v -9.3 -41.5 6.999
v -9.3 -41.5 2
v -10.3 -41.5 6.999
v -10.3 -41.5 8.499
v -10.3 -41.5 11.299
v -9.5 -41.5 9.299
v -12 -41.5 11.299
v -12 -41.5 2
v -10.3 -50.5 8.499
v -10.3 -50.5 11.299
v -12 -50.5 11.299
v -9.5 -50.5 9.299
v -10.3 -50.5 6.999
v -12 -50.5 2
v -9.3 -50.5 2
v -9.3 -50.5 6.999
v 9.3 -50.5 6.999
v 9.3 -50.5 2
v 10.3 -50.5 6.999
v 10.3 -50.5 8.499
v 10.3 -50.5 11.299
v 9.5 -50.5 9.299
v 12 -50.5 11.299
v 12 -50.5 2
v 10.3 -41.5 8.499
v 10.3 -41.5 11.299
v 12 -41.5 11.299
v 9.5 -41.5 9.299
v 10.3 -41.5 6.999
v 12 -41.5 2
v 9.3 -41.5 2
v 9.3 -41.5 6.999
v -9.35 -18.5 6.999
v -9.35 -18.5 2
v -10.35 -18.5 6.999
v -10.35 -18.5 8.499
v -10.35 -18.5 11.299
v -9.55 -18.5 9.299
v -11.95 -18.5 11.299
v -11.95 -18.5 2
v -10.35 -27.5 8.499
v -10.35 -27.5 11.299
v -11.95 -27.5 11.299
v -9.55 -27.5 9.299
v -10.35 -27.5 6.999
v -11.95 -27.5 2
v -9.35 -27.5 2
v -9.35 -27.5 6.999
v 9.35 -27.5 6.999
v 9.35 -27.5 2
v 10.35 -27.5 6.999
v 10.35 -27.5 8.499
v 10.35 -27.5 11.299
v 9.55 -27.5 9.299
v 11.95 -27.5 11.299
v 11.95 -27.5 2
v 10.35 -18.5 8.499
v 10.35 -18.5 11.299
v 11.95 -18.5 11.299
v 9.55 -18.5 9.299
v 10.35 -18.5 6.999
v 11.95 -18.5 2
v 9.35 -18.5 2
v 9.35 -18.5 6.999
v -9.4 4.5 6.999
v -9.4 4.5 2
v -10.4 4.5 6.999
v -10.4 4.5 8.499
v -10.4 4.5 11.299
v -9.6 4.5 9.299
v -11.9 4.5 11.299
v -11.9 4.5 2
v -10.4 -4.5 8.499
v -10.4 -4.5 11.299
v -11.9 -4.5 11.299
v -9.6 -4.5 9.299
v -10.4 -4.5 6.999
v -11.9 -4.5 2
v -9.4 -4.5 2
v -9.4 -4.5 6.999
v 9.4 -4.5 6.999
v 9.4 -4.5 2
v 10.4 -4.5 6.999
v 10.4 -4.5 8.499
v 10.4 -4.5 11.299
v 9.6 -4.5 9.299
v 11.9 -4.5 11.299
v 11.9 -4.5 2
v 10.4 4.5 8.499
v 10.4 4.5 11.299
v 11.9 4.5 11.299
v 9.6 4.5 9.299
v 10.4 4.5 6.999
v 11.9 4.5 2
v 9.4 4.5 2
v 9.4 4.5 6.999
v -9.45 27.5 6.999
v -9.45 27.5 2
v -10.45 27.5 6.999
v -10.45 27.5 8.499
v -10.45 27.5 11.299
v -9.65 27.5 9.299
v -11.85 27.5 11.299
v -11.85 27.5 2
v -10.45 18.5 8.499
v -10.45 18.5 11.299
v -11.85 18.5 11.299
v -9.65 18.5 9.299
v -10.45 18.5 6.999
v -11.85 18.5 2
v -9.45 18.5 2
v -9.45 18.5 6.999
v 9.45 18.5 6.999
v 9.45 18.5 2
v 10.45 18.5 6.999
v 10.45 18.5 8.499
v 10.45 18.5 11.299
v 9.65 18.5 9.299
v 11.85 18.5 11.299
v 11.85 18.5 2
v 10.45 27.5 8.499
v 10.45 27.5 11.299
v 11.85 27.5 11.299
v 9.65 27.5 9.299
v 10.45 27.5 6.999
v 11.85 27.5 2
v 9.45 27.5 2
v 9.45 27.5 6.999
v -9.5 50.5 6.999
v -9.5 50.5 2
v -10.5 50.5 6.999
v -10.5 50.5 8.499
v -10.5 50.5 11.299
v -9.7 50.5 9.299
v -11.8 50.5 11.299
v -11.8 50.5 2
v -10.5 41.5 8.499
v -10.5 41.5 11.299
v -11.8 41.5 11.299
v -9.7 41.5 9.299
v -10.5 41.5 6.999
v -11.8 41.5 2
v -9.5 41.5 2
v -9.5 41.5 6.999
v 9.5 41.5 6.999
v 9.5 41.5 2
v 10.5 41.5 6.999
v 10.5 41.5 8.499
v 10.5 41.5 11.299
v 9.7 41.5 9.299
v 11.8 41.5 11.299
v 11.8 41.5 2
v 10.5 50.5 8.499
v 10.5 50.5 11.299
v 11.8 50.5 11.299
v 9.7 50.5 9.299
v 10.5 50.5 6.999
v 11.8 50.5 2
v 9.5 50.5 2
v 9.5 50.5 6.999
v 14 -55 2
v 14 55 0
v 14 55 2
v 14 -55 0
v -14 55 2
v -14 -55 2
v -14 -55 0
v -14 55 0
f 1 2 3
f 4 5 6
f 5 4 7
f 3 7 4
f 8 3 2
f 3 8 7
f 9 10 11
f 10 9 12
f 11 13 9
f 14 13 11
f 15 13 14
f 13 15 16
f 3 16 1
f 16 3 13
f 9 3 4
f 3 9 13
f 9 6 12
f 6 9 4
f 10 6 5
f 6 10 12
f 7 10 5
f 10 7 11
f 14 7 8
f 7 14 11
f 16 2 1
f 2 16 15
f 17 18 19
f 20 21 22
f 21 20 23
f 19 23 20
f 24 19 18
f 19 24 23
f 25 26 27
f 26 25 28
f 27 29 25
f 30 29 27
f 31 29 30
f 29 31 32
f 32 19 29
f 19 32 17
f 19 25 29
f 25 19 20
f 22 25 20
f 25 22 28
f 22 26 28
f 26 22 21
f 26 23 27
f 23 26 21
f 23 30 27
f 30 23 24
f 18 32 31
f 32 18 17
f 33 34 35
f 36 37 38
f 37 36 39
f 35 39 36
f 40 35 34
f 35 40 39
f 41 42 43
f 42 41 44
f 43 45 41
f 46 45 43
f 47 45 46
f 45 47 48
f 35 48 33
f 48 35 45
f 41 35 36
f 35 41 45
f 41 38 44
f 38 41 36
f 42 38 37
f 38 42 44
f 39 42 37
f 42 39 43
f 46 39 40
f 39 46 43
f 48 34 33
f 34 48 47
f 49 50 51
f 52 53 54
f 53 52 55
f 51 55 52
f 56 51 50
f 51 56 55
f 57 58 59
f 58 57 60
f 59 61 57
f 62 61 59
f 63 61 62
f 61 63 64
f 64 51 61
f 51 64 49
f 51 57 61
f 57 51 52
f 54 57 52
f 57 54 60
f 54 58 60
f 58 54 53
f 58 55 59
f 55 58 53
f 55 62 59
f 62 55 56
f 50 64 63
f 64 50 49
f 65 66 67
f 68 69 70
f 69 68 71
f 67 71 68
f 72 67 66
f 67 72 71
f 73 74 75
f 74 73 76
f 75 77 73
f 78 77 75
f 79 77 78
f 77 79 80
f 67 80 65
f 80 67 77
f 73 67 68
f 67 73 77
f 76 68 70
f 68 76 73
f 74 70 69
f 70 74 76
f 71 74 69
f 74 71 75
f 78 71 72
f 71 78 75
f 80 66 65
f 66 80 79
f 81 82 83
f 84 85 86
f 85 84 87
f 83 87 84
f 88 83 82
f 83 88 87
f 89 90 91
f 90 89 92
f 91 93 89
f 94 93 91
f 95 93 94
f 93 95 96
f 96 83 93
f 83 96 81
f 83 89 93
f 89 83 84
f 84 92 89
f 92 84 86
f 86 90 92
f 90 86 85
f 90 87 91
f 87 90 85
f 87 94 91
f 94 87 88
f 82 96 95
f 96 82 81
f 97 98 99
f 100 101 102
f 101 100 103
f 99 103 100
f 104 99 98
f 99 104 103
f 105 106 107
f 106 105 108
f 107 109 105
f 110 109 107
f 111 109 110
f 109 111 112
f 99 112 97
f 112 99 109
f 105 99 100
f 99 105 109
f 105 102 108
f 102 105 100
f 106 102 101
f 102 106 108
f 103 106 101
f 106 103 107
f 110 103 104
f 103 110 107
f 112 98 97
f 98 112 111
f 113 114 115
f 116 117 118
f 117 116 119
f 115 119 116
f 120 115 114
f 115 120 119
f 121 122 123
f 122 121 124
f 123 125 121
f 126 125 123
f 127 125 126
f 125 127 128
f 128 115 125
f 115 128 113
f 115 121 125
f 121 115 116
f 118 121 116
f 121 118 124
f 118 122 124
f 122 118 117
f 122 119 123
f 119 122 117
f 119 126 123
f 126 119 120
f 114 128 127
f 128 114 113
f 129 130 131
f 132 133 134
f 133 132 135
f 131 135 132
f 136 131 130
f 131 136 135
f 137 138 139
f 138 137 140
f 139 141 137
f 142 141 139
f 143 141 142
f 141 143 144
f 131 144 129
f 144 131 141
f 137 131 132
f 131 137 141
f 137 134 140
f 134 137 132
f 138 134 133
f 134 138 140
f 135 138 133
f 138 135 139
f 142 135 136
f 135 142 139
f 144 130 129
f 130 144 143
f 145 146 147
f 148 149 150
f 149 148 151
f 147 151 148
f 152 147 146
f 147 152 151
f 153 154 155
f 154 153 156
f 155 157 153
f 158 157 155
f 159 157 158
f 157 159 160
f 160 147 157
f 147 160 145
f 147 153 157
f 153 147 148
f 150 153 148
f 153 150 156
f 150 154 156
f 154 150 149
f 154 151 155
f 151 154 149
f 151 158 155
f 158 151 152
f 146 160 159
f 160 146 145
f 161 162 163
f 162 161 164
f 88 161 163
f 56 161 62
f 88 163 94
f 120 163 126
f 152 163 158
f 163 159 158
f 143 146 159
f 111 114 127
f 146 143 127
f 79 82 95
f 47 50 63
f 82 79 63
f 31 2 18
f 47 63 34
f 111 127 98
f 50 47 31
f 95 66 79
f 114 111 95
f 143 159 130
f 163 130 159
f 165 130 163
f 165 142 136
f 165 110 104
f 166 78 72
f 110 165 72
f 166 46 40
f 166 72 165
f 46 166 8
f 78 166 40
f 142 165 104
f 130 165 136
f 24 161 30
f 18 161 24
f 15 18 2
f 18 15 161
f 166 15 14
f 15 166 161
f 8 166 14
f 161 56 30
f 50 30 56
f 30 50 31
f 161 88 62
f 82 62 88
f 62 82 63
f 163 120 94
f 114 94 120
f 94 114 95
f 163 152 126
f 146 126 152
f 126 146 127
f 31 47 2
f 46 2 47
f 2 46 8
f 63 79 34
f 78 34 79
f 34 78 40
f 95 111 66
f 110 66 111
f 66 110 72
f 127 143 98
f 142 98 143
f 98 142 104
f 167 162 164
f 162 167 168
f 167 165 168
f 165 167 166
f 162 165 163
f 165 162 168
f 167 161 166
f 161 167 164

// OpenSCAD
// file: pcb_clip.scad
//------------------------------------------------------------------
/*

PCB Clip

*/
//------------------------------------------------------------------

module clip(
  pcb_height,
  pcb_thickness,
  clip_height,
  clip_thickness,
  clip_depth,
  clip_width
) {
  theta0 = 45;
  factor = 0.8;
  x0 = clip_thickness - clip_depth;
  x1 = x0 + (clip_depth * factor);
  x2 = clip_thickness;
  y0 = pcb_height;
  y1 = y0 + pcb_thickness;
  y2 = y1 + (clip_depth * factor * tan(theta0));
  y3 = y2 + clip_height;
  points = [
    [0,0],
    [x2,0],
    [x2,y0],
    [x0,y0],
    [x0,y1],
    [x1,y2],
    [x0,y3],
    [0,y3],
  ];
  translate([0,clip_width/2,0])
  rotate([90,0,0])
  linear_extrude(height=clip_width) polygon(points=points);
}

module clip_pair(
  pcb_height,
  pcb_thickness,
  clip_height,
  clip_thickness,
  clip_depth,
  clip_width,
  clip_distance,
){
  x_ofs = clip_distance + (clip_thickness - clip_depth) * 2;

  translate([-x_ofs/2,0,0]) union(){
    clip(
      pcb_height,
      pcb_thickness,
      clip_height,
      clip_thickness,
      clip_depth,
      clip_width
    );
    translate([x_ofs,0,0]) rotate([0,0,180])clip(
      pcb_height,
      pcb_thickness,
      clip_height,
      clip_thickness,
      clip_depth,
      clip_width
    );
  }
}

//------------------------------------------------------------------
// main file
use <pcb_clip.scad>;

module clip_test() {

  y_ofs = 23;

  translate([0,-2 * y_ofs,0]) clip_pair(
    pcb_height = 5,
    pcb_thickness = 1.5,
    clip_height = 2,
    clip_thickness = 2.7,
    clip_depth = 1,
    clip_width = 9,
    clip_distance = 20.6
  );
  translate([0,-1 * y_ofs,0]) clip_pair(
    pcb_height = 5,
    pcb_thickness = 1.5,
    clip_height = 2,
    clip_thickness = 2.6,
    clip_depth = 1,
    clip_width = 9,
    clip_distance = 20.7
  );
  translate([0,0,0]) clip_pair(
    pcb_height = 5,
    pcb_thickness = 1.5,
    clip_height = 2,
    clip_thickness = 2.5,
    clip_depth = 1,
    clip_width = 9,
    clip_distance = 20.8
  );
  translate([0,1 * y_ofs,0]) clip_pair(
    pcb_height = 5,
    pcb_thickness = 1.5,
    clip_height = 2,
    clip_thickness = 2.4,
    clip_depth = 1,
    clip_width = 9,
    clip_distance = 20.9
  );
  translate([0,2 * y_ofs,0]) clip_pair(
    pcb_height = 5,
    pcb_thickness = 1.5,
    clip_height = 2,
    clip_thickness = 2.3,
    clip_depth = 1,
    clip_width = 9,
    clip_distance = 21.0
  );
}

module test_base(h) {
  w = 28;
  l = 110;
  translate([-w/2,-l/2,0]) cube([w,l,h]);
}

h = 2;
epsilon = 0.001;
test_base(h);
translate([0,0,h - epsilon]) clip_test();
